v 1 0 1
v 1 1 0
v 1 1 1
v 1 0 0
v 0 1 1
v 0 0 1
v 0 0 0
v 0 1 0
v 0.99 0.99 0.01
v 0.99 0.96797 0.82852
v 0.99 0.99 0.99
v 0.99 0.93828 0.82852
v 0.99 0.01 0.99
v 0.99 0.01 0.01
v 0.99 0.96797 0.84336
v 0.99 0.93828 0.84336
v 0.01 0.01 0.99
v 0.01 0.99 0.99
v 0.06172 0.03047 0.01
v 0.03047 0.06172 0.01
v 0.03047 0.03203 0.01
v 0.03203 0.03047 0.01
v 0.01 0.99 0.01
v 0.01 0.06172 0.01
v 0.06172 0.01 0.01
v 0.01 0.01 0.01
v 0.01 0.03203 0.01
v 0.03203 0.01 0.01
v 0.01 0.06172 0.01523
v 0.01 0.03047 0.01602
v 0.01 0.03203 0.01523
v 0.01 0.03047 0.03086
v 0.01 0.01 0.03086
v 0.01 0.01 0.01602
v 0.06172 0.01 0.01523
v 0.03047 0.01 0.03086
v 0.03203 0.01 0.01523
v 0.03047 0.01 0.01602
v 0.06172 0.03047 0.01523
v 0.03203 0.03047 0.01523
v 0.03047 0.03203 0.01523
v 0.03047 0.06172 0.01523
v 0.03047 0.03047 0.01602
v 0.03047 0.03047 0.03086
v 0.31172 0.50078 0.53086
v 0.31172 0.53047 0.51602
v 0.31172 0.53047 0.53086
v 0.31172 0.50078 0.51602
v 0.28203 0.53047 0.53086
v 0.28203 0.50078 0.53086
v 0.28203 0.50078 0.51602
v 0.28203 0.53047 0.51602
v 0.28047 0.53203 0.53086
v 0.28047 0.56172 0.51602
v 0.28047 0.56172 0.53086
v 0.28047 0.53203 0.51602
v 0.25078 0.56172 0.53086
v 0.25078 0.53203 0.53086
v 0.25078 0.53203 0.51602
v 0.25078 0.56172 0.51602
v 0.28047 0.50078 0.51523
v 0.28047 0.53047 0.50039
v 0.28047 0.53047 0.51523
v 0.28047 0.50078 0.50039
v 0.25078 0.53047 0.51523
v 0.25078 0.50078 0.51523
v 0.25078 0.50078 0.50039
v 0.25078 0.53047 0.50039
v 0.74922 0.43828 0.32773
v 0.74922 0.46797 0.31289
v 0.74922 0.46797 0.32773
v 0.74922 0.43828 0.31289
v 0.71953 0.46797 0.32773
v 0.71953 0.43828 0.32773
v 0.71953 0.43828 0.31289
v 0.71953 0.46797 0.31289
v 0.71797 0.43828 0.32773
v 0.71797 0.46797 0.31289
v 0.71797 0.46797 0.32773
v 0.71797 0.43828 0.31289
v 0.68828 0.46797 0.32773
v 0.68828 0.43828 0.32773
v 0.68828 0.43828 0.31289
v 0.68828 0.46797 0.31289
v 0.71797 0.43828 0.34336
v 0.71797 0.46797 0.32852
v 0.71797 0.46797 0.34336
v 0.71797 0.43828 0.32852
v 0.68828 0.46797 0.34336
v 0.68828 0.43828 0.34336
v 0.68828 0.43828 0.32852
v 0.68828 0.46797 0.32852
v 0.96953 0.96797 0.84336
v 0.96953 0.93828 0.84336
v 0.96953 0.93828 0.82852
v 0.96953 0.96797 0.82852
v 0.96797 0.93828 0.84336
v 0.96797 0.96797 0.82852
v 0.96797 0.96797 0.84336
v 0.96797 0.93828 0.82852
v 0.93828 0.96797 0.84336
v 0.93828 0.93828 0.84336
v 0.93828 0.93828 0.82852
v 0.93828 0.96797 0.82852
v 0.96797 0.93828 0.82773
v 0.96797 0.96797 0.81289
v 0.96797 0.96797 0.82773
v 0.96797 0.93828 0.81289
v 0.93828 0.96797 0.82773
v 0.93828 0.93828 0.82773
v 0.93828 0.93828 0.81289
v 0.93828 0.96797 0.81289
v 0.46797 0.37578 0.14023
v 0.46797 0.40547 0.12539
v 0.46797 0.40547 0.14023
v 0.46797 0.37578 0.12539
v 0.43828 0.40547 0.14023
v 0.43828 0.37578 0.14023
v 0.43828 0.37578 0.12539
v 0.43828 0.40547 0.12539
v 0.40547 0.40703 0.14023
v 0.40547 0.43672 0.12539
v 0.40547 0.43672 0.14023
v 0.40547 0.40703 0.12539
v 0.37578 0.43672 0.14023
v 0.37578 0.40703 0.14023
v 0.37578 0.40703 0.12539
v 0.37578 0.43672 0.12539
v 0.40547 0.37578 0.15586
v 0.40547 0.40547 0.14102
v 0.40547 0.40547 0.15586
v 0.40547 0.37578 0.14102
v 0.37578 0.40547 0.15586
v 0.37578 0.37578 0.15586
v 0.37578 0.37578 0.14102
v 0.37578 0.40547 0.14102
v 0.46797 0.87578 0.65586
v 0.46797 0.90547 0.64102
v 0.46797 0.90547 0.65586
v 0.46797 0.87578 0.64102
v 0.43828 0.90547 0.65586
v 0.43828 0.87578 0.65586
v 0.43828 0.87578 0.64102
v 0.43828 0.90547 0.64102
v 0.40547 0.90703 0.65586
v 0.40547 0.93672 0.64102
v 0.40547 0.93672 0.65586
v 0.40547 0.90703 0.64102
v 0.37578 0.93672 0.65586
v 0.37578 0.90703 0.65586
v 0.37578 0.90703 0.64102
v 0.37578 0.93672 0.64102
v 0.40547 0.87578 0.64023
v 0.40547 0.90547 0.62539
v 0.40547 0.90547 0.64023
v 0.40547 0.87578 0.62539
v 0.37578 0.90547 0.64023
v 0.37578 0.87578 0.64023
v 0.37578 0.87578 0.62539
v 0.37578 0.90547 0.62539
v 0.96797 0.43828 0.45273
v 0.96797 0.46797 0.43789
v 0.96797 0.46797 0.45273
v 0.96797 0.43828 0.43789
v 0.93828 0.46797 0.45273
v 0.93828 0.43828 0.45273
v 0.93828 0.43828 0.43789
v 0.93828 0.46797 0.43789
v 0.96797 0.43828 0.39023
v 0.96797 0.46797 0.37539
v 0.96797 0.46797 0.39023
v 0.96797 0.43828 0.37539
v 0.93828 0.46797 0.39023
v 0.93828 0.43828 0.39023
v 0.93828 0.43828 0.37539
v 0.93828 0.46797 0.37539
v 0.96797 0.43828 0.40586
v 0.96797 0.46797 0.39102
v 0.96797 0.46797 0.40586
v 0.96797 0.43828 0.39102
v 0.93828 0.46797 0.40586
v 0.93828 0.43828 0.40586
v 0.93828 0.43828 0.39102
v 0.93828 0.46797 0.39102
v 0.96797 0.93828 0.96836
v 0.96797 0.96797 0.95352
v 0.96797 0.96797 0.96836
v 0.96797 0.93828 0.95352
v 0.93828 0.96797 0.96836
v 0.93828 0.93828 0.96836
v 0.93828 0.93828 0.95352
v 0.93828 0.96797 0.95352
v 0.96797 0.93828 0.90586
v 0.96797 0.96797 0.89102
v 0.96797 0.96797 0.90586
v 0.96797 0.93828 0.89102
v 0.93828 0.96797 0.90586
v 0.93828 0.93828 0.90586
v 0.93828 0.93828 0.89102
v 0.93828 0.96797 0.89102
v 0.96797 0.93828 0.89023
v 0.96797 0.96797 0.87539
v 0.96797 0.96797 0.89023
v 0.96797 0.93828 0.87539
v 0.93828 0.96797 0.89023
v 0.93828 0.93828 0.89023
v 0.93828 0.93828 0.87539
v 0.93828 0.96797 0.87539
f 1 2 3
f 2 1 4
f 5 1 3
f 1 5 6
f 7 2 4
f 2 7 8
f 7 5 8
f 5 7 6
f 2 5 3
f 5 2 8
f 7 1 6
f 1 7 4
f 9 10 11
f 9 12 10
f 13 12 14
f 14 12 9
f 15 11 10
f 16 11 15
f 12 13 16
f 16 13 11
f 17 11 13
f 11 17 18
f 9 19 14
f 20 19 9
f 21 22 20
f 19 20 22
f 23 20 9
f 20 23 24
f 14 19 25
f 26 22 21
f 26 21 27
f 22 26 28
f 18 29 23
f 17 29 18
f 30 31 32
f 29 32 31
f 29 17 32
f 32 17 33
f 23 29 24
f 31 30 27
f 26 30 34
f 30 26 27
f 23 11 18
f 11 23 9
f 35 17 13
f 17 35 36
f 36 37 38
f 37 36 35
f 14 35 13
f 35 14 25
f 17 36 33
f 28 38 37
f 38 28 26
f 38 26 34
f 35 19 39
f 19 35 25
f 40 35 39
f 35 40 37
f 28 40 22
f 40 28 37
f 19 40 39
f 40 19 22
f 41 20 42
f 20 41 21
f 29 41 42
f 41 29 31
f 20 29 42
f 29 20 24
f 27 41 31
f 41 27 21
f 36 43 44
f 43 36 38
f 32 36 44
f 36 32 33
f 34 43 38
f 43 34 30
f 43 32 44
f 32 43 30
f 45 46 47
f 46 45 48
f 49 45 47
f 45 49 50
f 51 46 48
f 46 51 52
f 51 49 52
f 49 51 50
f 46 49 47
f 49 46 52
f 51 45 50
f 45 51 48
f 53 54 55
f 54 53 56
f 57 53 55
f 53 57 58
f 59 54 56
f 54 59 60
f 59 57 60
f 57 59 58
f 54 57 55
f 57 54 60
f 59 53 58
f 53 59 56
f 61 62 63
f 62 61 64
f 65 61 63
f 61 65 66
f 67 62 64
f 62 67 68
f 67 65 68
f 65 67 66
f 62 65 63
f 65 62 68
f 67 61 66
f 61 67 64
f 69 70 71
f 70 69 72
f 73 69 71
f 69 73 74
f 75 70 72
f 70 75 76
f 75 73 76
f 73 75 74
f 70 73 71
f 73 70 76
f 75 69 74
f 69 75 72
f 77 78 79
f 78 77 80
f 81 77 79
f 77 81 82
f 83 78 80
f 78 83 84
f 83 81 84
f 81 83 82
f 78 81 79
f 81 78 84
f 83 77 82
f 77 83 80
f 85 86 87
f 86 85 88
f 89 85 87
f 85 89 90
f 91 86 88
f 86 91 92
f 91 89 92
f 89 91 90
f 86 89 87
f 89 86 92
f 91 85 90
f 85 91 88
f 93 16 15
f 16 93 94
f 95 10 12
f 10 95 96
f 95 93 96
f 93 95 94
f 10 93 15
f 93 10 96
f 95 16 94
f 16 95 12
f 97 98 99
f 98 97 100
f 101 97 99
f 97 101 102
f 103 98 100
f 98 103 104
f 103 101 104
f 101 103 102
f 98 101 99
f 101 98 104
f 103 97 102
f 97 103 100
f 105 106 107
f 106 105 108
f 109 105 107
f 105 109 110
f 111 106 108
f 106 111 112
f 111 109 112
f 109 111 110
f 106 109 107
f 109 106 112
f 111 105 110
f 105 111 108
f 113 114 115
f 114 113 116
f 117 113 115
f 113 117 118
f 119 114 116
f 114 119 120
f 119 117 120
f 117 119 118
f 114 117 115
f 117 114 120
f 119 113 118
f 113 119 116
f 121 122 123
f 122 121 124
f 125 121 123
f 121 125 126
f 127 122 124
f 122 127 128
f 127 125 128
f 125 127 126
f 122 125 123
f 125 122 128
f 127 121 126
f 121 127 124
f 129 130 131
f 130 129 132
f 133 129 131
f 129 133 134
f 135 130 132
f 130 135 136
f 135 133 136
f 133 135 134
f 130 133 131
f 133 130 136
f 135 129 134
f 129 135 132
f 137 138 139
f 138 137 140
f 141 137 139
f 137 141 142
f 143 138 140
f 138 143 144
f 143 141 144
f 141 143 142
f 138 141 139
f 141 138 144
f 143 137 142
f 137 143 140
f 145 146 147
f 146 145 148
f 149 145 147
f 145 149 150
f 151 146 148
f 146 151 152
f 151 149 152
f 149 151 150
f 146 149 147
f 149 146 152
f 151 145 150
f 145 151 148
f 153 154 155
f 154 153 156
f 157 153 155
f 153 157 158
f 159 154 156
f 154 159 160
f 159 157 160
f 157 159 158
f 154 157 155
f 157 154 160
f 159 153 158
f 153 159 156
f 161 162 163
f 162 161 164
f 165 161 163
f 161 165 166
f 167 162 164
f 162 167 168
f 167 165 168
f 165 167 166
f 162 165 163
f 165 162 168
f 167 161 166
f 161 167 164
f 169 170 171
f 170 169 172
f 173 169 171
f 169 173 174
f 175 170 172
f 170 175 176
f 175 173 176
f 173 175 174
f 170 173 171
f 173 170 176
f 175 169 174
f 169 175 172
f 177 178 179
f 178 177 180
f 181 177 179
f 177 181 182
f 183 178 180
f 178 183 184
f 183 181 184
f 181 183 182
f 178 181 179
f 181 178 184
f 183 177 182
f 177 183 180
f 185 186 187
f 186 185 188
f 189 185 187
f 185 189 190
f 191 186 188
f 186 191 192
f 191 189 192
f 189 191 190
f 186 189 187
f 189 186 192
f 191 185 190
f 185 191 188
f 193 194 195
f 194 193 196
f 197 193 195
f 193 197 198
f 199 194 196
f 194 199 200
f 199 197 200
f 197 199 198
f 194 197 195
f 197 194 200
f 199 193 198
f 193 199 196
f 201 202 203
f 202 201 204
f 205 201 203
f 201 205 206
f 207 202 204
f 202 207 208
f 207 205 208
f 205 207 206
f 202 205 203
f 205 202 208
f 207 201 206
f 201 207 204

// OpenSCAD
translate([0.046875, 0.015625, 0.0078125]) color([0.6755197251802578, 0.41487488756696345, 0.5733633065217538]) cube([0.0296875, 0.0296875, 0.01484375], center=true);
translate([0.015625, 0.046875, 0.0078125]) color([0.8352652083788017, 0.4789645616530247, 0.8888242662849705]) cube([0.0296875, 0.0296875, 0.01484375], center=true);
translate([0.015625, 0.015625, 0.0234375]) color([0.7977003312522131, 0.4430245559395397, 0.5757872208285841]) cube([0.0296875, 0.0296875, 0.01484375], center=true);
translate([0.296875, 0.515625, 0.5234375]) color([0.18894415855786206, 0.8084526775944827, 0.5240727557148024]) cube([0.0296875, 0.0296875, 0.01484375], center=true);
translate([0.265625, 0.546875, 0.5234375]) color([0.33009817895383553, 0.6358447971330878, 0.274476683198677]) cube([0.0296875, 0.0296875, 0.01484375], center=true);
translate([0.265625, 0.515625, 0.5078125]) color([0.7036882936284021, 0.9548751840233447, 0.5755708060880032]) cube([0.0296875, 0.0296875, 0.01484375], center=true);
translate([0.734375, 0.453125, 0.3203125]) color([0.41204698353559877, 0.5796286851254486, 0.28286322414623355]) cube([0.0296875, 0.0296875, 0.01484375], center=true);
translate([0.703125, 0.453125, 0.3203125]) color([0.83488960487533, 0.7968053445508819, 0.9111606805714901]) cube([0.0296875, 0.0296875, 0.01484375], center=true);
translate([0.703125, 0.453125, 0.3359375]) color([0.24277728252059738, 0.2698201644401115, 0.25372921938475945]) cube([0.0296875, 0.0296875, 0.01484375], center=true);
translate([0.984375, 0.953125, 0.8359375]) color([0.3248429479181304, 0.33731838939050207, 0.46012102584031667]) cube([0.0296875, 0.0296875, 0.01484375], center=true);
translate([0.953125, 0.953125, 0.8359375]) color([0.4972140619467261, 0.4460540182101679, 0.582257111213957]) cube([0.0296875, 0.0296875, 0.01484375], center=true);
translate([0.953125, 0.953125, 0.8203125]) color([0.38189019333285656, 0.9329183366158048, 0.74346568951076]) cube([0.0296875, 0.0296875, 0.01484375], center=true);
translate([0.453125, 0.390625, 0.1328125]) color([0.10367473231816282, 0.6513301228797536, 0.21210212161149367]) cube([0.0296875, 0.0296875, 0.01484375], center=true);
translate([0.390625, 0.421875, 0.1328125]) color([0.4071949612628585, 0.6715659813617996, 0.17871221391606673]) cube([0.0296875, 0.0296875, 0.01484375], center=true);
translate([0.390625, 0.390625, 0.1484375]) color([0.17752412341011714, 0.6556599876579107, 0.7040052939421468]) cube([0.0296875, 0.0296875, 0.01484375], center=true);
translate([0.453125, 0.890625, 0.6484375]) color([0.9236087761692187, 0.21340315940002685, 0.5989435772305987]) cube([0.0296875, 0.0296875, 0.01484375], center=true);
translate([0.390625, 0.921875, 0.6484375]) color([0.8450733127471588, 0.6003349610680997, 0.5954496070156984]) cube([0.0296875, 0.0296875, 0.01484375], center=true);
translate([0.390625, 0.890625, 0.6328125]) color([0.920709623693076, 0.4233833186292486, 0.4754938941291812]) cube([0.0296875, 0.0296875, 0.01484375], center=true);
translate([0.953125, 0.453125, 0.4453125]) color([0.872421437716006, 0.9767589381362137, 0.9086126193256788]) cube([0.0296875, 0.0296875, 0.01484375], center=true);
translate([0.953125, 0.453125, 0.3828125]) color([0.7884233486788577, 0.8262914624918754, 0.6636415038118221]) cube([0.0296875, 0.0296875, 0.01484375], center=true);
translate([0.953125, 0.453125, 0.3984375]) color([0.36270118963089737, 0.5138414630226216, 0.14357255994509865]) cube([0.0296875, 0.0296875, 0.01484375], center=true);
translate([0.953125, 0.953125, 0.9609375]) color([0.466624584989368, 0.29734697142143796, 0.9844700368526675]) cube([0.0296875, 0.0296875, 0.01484375], center=true);
translate([0.953125, 0.953125, 0.8984375]) color([0.6752891164641136, 0.29017518075598103, 0.4342964607752302]) cube([0.0296875, 0.0296875, 0.01484375], center=true);
translate([0.953125, 0.953125, 0.8828125]) color([0.773003957160343, 0.565247166210502, 0.9239404304157245]) cube([0.0296875, 0.0296875, 0.01484375], center=true);
color([0.3,0.3,0.3,0.3]) difference() { cube([1,1,1]); translate([0.01,0.01,0.01]) cube([0.98,0.98,0.98]); }
